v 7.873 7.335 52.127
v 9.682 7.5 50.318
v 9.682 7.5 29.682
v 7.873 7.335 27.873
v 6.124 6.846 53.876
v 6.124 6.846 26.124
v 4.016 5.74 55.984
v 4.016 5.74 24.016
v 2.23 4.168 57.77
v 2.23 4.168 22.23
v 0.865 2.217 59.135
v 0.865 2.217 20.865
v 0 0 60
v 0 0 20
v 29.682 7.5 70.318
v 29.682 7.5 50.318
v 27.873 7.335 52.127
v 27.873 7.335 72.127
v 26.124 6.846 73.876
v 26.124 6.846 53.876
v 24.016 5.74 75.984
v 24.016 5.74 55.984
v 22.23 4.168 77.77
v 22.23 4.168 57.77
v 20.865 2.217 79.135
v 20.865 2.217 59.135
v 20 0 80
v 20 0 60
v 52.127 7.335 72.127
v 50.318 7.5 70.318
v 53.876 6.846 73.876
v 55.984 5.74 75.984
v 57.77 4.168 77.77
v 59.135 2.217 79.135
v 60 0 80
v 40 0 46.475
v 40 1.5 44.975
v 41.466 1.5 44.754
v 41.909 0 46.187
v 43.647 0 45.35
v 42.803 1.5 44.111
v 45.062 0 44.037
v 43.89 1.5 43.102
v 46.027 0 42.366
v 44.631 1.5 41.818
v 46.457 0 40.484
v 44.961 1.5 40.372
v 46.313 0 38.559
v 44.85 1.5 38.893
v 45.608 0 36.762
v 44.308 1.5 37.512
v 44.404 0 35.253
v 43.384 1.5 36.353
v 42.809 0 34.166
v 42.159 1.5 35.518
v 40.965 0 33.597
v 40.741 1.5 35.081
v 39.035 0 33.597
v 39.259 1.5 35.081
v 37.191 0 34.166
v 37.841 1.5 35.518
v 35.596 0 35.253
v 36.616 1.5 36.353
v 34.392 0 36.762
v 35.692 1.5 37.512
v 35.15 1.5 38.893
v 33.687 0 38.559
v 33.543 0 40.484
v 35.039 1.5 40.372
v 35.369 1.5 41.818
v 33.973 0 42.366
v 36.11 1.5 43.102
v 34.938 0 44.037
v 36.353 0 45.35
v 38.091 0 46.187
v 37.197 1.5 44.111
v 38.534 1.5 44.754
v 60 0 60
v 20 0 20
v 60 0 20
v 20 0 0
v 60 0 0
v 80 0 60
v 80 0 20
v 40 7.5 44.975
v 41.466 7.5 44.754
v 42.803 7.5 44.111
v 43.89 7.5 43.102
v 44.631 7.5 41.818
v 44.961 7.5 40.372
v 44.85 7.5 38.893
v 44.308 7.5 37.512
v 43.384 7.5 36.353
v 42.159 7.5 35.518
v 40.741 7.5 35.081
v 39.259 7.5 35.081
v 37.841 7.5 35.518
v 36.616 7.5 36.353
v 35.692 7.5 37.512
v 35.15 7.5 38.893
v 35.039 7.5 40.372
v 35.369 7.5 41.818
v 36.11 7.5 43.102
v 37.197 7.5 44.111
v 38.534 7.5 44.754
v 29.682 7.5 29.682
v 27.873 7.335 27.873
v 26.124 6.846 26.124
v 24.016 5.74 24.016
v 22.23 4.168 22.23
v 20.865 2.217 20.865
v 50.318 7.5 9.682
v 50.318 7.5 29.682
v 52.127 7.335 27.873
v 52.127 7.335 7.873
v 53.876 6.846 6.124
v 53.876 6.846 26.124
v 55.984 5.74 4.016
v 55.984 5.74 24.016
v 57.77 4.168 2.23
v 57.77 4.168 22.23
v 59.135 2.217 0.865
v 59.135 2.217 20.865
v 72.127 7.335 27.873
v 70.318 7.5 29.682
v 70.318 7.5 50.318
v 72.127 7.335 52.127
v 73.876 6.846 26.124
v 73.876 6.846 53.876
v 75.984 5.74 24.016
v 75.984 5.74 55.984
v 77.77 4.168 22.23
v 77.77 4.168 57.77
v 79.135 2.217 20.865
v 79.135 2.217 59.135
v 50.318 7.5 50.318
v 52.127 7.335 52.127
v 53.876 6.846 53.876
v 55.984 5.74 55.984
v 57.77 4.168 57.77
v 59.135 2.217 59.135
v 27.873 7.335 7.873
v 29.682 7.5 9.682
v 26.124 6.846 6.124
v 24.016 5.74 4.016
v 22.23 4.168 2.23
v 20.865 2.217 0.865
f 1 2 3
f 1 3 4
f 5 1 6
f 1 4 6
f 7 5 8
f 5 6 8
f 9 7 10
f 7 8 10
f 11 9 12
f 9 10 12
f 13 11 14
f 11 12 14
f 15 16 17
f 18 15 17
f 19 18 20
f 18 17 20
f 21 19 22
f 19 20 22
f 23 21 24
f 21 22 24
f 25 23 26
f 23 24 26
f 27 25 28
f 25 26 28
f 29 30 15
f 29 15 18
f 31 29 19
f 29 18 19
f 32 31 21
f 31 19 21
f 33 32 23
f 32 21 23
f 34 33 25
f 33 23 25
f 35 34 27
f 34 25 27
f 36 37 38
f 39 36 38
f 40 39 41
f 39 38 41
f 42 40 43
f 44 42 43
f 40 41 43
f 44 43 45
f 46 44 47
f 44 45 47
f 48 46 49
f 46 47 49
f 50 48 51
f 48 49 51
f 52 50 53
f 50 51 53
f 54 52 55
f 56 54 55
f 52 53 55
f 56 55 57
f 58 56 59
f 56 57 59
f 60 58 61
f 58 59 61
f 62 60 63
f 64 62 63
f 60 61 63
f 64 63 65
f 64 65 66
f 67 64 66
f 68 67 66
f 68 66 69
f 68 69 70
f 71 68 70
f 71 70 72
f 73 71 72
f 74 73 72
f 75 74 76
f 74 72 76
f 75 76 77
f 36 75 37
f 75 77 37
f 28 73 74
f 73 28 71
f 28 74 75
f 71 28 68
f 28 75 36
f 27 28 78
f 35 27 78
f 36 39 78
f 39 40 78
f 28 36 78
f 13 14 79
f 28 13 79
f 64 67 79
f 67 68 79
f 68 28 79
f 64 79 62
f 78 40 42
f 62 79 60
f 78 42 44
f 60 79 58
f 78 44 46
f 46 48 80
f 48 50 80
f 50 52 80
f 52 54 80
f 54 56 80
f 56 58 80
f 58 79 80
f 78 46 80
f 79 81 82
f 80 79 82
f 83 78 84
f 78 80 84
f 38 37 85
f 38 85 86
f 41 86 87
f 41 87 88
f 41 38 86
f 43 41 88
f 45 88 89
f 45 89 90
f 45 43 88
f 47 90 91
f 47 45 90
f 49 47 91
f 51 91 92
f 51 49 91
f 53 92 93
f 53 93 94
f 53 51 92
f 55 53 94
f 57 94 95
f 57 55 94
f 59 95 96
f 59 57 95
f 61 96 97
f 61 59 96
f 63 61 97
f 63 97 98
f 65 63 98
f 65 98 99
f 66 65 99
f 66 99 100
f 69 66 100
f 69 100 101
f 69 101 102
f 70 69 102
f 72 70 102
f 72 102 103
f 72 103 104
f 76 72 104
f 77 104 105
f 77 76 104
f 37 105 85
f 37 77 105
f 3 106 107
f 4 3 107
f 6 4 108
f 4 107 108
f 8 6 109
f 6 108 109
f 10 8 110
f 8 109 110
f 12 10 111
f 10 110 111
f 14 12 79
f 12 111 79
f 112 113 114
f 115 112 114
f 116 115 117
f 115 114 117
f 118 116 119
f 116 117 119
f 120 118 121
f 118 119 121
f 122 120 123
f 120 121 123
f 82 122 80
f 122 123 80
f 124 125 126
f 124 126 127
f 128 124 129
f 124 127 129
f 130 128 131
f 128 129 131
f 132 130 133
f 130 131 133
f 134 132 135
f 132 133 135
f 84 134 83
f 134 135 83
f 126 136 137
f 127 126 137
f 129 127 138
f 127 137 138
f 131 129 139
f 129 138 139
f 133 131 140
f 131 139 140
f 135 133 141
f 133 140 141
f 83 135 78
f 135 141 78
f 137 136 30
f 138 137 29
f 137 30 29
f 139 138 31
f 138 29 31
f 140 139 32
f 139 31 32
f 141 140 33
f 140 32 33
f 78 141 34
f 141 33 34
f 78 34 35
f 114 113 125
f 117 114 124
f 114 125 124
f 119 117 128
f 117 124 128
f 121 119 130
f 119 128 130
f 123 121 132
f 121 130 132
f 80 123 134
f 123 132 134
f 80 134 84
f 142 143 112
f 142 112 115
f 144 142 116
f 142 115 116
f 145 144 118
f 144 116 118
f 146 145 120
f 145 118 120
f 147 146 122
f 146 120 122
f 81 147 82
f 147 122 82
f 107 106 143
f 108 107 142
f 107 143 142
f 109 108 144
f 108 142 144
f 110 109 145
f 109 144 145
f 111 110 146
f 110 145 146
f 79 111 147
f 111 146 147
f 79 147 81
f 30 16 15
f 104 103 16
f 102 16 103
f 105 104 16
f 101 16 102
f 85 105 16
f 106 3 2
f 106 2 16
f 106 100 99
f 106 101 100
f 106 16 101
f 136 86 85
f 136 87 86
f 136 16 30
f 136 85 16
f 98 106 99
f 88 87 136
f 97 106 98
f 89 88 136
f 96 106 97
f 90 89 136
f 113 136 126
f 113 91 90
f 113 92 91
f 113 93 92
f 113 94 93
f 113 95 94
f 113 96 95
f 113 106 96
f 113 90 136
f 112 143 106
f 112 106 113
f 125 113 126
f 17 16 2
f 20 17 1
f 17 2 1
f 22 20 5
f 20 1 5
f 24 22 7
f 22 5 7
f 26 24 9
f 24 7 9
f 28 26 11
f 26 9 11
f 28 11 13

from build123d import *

# Parameters (mm, degrees)
BOSS_EXTRUDE1_DEPTH = 7.5
FILLET1_R           = 10
SKETCH2_R           = 4.975
CUT_EXTRUDE1_DEPTH  = 7.5
CHAMFER1_SIZE       = 1.5


with BuildPart() as part:
    # Sketch1 → Boss-Extrude1 (new body)
    with BuildSketch(Plane(origin=(0, 0, 0), x_dir=(1, 0, 0), z_dir=(0, 1, 0))):
        Polygon((60, 0), (20, 0), (20, -20), (0, -20), (0, -60), (20, -60), (20, -80), (60, -80), (60, -60), (80, -60), (80, -20), (60, -20), align=None)
    extrude(amount=BOSS_EXTRUDE1_DEPTH)

    # Fillet1
    # the kernel refuses this fillet: 10 mm, written as the material it takes off along each edge
    with BuildSketch(Plane(origin=(20, 7.5, -24.206145914), x_dir=(0, -1, 0), z_dir=(0, 0, 1)), Plane(origin=(60, 7.5, 20), x_dir=(0, -1, 0), z_dir=(0, 0, -1)), Plane(origin=(104.206145914, 7.5, 20), x_dir=(0, -1, 0), z_dir=(-1, 0, 0)), Plane(origin=(60, 7.5, 60), x_dir=(0, -1, 0), z_dir=(1, 0, 0)), Plane(origin=(60, 7.5, 104.206145914), x_dir=(0, -1, 0), z_dir=(0, 0, -1)), Plane(origin=(20, 7.5, 60), x_dir=(0, -1, 0), z_dir=(0, 0, 1)), Plane(origin=(-24.206145914, 7.5, 60), x_dir=(0, -1, 0), z_dir=(1, 0, 0)), Plane(origin=(20, 7.5, 20), x_dir=(0, -1, 0), z_dir=(-1, 0, 0))) as fillet1_piece_1:
        with BuildLine():
            CenterArc((10, 9.682458366), FILLET1_R, 180, 75.522487814)
            Line((0, 9.682458366), (-0.2, 9.682458366))
            Line((-0.2, 9.682458366), (-0.2, 0))
            Line((-0.2, 0), (0, -0.2))
            ThreePointArc((0, -0.2), (3.75, -0.2), (7.45, -0.193649167))
            Line((7.45, -0.193649167), (7.5, 0))
        make_face()
    extrude(amount=44.206145914, mode=Mode.SUBTRACT)
    with BuildSketch(Plane(origin=(84.206145914, 7.5, 0), x_dir=(0, -1, 0), z_dir=(-1, 0, 0)), Plane(origin=(80, 7.5, 84.206145914), x_dir=(0, -1, 0), z_dir=(0, 0, -1)), Plane(origin=(-4.206145914, 7.5, 80), x_dir=(0, -1, 0), z_dir=(1, 0, 0)), Plane(origin=(0, 7.5, -4.206145914), x_dir=(0, -1, 0), z_dir=(0, 0, 1))) as fillet1_piece_2:
        with BuildLine():
            CenterArc((10, 9.682458366), FILLET1_R, 180, 75.522487814)
            Line((0, 9.682458366), (-0.2, 9.682458366))
            Line((-0.2, 9.682458366), (-0.2, 0))
            Line((-0.2, 0), (0, -0.2))
            ThreePointArc((0, -0.2), (3.75, -0.2), (7.45, -0.193649167))
            Line((7.45, -0.193649167), (7.5, 0))
        make_face()
    extrude(amount=88.412291828, mode=Mode.SUBTRACT)
    with BuildSketch(Plane(origin=(20, 7.5, -24.206145914), x_dir=(0, -1, 0), z_dir=(0, 0, 1))) as fillet1_piece_3a_section:
        with BuildLine():
            CenterArc((10, 9.682458366), FILLET1_R, 180, 75.522487814)
            Line((0, 9.682458366), (-0.2, 9.682458366))
            Line((-0.2, 9.682458366), (-0.2, 0))
            Line((-0.2, 0), (0, -0.2))
            ThreePointArc((0, -0.2), (3.75, -0.2), (7.45, -0.193649167))
            Line((7.45, -0.193649167), (7.5, 0))
        make_face()
    fillet1_piece_3a = extrude(amount=68.412291828, mode=Mode.PRIVATE)
    fillet1_piece_3a = split(fillet1_piece_3a, bisect_by=Plane(origin=(22.281441008, 5.604082443, 20), z_dir=(0, 0, 1)), keep=Keep.TOP, mode=Mode.PRIVATE)
    with BuildSketch(Plane(origin=(44.206145914, 7.5, 20), x_dir=(0, -1, 0), z_dir=(-1, 0, 0))) as fillet1_piece_3b_section:
        with BuildLine():
            CenterArc((10, 9.682458366), FILLET1_R, 180, 75.522487814)
            Line((0, 9.682458366), (-0.2, 9.682458366))
            Line((-0.2, 9.682458366), (-0.2, 0))
            Line((-0.2, 0), (0, -0.2))
            ThreePointArc((0, -0.2), (3.75, -0.2), (7.45, -0.193649167))
            Line((7.45, -0.193649167), (7.5, 0))
        make_face()
    fillet1_piece_3b = extrude(amount=68.412291828, mode=Mode.PRIVATE)
    fillet1_piece_3b = split(fillet1_piece_3b, bisect_by=Plane(origin=(20, 5.604082443, 22.281441008), z_dir=(1, 0, 0)), keep=Keep.TOP, mode=Mode.PRIVATE)
    fillet1_piece_3 = fillet1_piece_3a & fillet1_piece_3b
    add(fillet1_piece_3, mode=Mode.SUBTRACT)
    with BuildSketch(Plane(origin=(104.206145914, 7.5, 20), x_dir=(0, -1, 0), z_dir=(-1, 0, 0))) as fillet1_piece_4a_section:
        with BuildLine():
            CenterArc((10, 9.682458366), FILLET1_R, 180, 75.522487814)
            Line((0, 9.682458366), (-0.2, 9.682458366))
            Line((-0.2, 9.682458366), (-0.2, 0))
            Line((-0.2, 0), (0, -0.2))
            ThreePointArc((0, -0.2), (3.75, -0.2), (7.45, -0.193649167))
            Line((7.45, -0.193649167), (7.5, 0))
        make_face()
    fillet1_piece_4a = extrude(amount=68.412291828, mode=Mode.PRIVATE)
    fillet1_piece_4a = split(fillet1_piece_4a, bisect_by=Plane(origin=(60, 5.604082443, 22.281441008), z_dir=(-1, 0, 0)), keep=Keep.TOP, mode=Mode.PRIVATE)
    with BuildSketch(Plane(origin=(60, 7.5, 44.206145914), x_dir=(0, -1, 0), z_dir=(0, 0, -1))) as fillet1_piece_4b_section:
        with BuildLine():
            CenterArc((10, 9.682458366), FILLET1_R, 180, 75.522487814)
            Line((0, 9.682458366), (-0.2, 9.682458366))
            Line((-0.2, 9.682458366), (-0.2, 0))
            Line((-0.2, 0), (0, -0.2))
            ThreePointArc((0, -0.2), (3.75, -0.2), (7.45, -0.193649167))
            Line((7.45, -0.193649167), (7.5, 0))
        make_face()
    fillet1_piece_4b = extrude(amount=68.412291828, mode=Mode.PRIVATE)
    fillet1_piece_4b = split(fillet1_piece_4b, bisect_by=Plane(origin=(57.718558992, 5.604082443, 20), z_dir=(0, 0, 1)), keep=Keep.TOP, mode=Mode.PRIVATE)
    fillet1_piece_4 = fillet1_piece_4a & fillet1_piece_4b
    add(fillet1_piece_4, mode=Mode.SUBTRACT)
    with BuildSketch(Plane(origin=(60, 7.5, 104.206145914), x_dir=(0, -1, 0), z_dir=(0, 0, -1))) as fillet1_piece_5a_section:
        with BuildLine():
            CenterArc((10, 9.682458366), FILLET1_R, 180, 75.522487814)
            Line((0, 9.682458366), (-0.2, 9.682458366))
            Line((-0.2, 9.682458366), (-0.2, 0))
            Line((-0.2, 0), (0, -0.2))
            ThreePointArc((0, -0.2), (3.75, -0.2), (7.45, -0.193649167))
            Line((7.45, -0.193649167), (7.5, 0))
        make_face()
    fillet1_piece_5a = extrude(amount=68.412291828, mode=Mode.PRIVATE)
    fillet1_piece_5a = split(fillet1_piece_5a, bisect_by=Plane(origin=(57.718558992, 5.604082443, 60), z_dir=(0, 0, -1)), keep=Keep.TOP, mode=Mode.PRIVATE)
    with BuildSketch(Plane(origin=(35.793854086, 7.5, 60), x_dir=(0, -1, 0), z_dir=(1, 0, 0))) as fillet1_piece_5b_section:
        with BuildLine():
            CenterArc((10, 9.682458366), FILLET1_R, 180, 75.522487814)
            Line((0, 9.682458366), (-0.2, 9.682458366))
            Line((-0.2, 9.682458366), (-0.2, 0))
            Line((-0.2, 0), (0, -0.2))
            ThreePointArc((0, -0.2), (3.75, -0.2), (7.45, -0.193649167))
            Line((7.45, -0.193649167), (7.5, 0))
        make_face()
    fillet1_piece_5b = extrude(amount=68.412291828, mode=Mode.PRIVATE)
    fillet1_piece_5b = split(fillet1_piece_5b, bisect_by=Plane(origin=(60, 5.604082443, 57.718558992), z_dir=(-1, 0, 0)), keep=Keep.TOP, mode=Mode.PRIVATE)
    fillet1_piece_5 = fillet1_piece_5a & fillet1_piece_5b
    add(fillet1_piece_5, mode=Mode.SUBTRACT)
    with BuildSketch(Plane(origin=(-24.206145914, 7.5, 60), x_dir=(0, -1, 0), z_dir=(1, 0, 0))) as fillet1_piece_6a_section:
        with BuildLine():
            CenterArc((10, 9.682458366), FILLET1_R, 180, 75.522487814)
            Line((0, 9.682458366), (-0.2, 9.682458366))
            Line((-0.2, 9.682458366), (-0.2, 0))
            Line((-0.2, 0), (0, -0.2))
            ThreePointArc((0, -0.2), (3.75, -0.2), (7.45, -0.193649167))
            Line((7.45, -0.193649167), (7.5, 0))
        make_face()
    fillet1_piece_6a = extrude(amount=68.412291828, mode=Mode.PRIVATE)
    fillet1_piece_6a = split(fillet1_piece_6a, bisect_by=Plane(origin=(20, 5.604082443, 57.718558992), z_dir=(1, 0, 0)), keep=Keep.TOP, mode=Mode.PRIVATE)
    with BuildSketch(Plane(origin=(20, 7.5, 35.793854086), x_dir=(0, -1, 0), z_dir=(0, 0, 1))) as fillet1_piece_6b_section:
        with BuildLine():
            CenterArc((10, 9.682458366), FILLET1_R, 180, 75.522487814)
            Line((0, 9.682458366), (-0.2, 9.682458366))
            Line((-0.2, 9.682458366), (-0.2, 0))
            Line((-0.2, 0), (0, -0.2))
            ThreePointArc((0, -0.2), (3.75, -0.2), (7.45, -0.193649167))
            Line((7.45, -0.193649167), (7.5, 0))
        make_face()
    fillet1_piece_6b = extrude(amount=68.412291828, mode=Mode.PRIVATE)
    fillet1_piece_6b = split(fillet1_piece_6b, bisect_by=Plane(origin=(22.281441008, 5.604082443, 60), z_dir=(0, 0, -1)), keep=Keep.TOP, mode=Mode.PRIVATE)
    fillet1_piece_6 = fillet1_piece_6a & fillet1_piece_6b
    add(fillet1_piece_6, mode=Mode.SUBTRACT)

    # Sketch2 → Cut-Extrude1 (cut)
    with BuildSketch(Plane(origin=(0, 0, 0), x_dir=(1, 0, 0), z_dir=(0, 1, 0))):
        with Locations(Location((40, -40, 0), (0, 0, 270))):
            Circle(SKETCH2_R)
    extrude(amount=CUT_EXTRUDE1_DEPTH, mode=Mode.SUBTRACT)

    # Chamfer1
    chamfer1_edges = [part.edges().sort_by_distance(p)[0] for p in [
        (40, 0, 35.025),
    ]]
    chamfer(chamfer1_edges, length=CHAMFER1_SIZE)


solid = part.part
